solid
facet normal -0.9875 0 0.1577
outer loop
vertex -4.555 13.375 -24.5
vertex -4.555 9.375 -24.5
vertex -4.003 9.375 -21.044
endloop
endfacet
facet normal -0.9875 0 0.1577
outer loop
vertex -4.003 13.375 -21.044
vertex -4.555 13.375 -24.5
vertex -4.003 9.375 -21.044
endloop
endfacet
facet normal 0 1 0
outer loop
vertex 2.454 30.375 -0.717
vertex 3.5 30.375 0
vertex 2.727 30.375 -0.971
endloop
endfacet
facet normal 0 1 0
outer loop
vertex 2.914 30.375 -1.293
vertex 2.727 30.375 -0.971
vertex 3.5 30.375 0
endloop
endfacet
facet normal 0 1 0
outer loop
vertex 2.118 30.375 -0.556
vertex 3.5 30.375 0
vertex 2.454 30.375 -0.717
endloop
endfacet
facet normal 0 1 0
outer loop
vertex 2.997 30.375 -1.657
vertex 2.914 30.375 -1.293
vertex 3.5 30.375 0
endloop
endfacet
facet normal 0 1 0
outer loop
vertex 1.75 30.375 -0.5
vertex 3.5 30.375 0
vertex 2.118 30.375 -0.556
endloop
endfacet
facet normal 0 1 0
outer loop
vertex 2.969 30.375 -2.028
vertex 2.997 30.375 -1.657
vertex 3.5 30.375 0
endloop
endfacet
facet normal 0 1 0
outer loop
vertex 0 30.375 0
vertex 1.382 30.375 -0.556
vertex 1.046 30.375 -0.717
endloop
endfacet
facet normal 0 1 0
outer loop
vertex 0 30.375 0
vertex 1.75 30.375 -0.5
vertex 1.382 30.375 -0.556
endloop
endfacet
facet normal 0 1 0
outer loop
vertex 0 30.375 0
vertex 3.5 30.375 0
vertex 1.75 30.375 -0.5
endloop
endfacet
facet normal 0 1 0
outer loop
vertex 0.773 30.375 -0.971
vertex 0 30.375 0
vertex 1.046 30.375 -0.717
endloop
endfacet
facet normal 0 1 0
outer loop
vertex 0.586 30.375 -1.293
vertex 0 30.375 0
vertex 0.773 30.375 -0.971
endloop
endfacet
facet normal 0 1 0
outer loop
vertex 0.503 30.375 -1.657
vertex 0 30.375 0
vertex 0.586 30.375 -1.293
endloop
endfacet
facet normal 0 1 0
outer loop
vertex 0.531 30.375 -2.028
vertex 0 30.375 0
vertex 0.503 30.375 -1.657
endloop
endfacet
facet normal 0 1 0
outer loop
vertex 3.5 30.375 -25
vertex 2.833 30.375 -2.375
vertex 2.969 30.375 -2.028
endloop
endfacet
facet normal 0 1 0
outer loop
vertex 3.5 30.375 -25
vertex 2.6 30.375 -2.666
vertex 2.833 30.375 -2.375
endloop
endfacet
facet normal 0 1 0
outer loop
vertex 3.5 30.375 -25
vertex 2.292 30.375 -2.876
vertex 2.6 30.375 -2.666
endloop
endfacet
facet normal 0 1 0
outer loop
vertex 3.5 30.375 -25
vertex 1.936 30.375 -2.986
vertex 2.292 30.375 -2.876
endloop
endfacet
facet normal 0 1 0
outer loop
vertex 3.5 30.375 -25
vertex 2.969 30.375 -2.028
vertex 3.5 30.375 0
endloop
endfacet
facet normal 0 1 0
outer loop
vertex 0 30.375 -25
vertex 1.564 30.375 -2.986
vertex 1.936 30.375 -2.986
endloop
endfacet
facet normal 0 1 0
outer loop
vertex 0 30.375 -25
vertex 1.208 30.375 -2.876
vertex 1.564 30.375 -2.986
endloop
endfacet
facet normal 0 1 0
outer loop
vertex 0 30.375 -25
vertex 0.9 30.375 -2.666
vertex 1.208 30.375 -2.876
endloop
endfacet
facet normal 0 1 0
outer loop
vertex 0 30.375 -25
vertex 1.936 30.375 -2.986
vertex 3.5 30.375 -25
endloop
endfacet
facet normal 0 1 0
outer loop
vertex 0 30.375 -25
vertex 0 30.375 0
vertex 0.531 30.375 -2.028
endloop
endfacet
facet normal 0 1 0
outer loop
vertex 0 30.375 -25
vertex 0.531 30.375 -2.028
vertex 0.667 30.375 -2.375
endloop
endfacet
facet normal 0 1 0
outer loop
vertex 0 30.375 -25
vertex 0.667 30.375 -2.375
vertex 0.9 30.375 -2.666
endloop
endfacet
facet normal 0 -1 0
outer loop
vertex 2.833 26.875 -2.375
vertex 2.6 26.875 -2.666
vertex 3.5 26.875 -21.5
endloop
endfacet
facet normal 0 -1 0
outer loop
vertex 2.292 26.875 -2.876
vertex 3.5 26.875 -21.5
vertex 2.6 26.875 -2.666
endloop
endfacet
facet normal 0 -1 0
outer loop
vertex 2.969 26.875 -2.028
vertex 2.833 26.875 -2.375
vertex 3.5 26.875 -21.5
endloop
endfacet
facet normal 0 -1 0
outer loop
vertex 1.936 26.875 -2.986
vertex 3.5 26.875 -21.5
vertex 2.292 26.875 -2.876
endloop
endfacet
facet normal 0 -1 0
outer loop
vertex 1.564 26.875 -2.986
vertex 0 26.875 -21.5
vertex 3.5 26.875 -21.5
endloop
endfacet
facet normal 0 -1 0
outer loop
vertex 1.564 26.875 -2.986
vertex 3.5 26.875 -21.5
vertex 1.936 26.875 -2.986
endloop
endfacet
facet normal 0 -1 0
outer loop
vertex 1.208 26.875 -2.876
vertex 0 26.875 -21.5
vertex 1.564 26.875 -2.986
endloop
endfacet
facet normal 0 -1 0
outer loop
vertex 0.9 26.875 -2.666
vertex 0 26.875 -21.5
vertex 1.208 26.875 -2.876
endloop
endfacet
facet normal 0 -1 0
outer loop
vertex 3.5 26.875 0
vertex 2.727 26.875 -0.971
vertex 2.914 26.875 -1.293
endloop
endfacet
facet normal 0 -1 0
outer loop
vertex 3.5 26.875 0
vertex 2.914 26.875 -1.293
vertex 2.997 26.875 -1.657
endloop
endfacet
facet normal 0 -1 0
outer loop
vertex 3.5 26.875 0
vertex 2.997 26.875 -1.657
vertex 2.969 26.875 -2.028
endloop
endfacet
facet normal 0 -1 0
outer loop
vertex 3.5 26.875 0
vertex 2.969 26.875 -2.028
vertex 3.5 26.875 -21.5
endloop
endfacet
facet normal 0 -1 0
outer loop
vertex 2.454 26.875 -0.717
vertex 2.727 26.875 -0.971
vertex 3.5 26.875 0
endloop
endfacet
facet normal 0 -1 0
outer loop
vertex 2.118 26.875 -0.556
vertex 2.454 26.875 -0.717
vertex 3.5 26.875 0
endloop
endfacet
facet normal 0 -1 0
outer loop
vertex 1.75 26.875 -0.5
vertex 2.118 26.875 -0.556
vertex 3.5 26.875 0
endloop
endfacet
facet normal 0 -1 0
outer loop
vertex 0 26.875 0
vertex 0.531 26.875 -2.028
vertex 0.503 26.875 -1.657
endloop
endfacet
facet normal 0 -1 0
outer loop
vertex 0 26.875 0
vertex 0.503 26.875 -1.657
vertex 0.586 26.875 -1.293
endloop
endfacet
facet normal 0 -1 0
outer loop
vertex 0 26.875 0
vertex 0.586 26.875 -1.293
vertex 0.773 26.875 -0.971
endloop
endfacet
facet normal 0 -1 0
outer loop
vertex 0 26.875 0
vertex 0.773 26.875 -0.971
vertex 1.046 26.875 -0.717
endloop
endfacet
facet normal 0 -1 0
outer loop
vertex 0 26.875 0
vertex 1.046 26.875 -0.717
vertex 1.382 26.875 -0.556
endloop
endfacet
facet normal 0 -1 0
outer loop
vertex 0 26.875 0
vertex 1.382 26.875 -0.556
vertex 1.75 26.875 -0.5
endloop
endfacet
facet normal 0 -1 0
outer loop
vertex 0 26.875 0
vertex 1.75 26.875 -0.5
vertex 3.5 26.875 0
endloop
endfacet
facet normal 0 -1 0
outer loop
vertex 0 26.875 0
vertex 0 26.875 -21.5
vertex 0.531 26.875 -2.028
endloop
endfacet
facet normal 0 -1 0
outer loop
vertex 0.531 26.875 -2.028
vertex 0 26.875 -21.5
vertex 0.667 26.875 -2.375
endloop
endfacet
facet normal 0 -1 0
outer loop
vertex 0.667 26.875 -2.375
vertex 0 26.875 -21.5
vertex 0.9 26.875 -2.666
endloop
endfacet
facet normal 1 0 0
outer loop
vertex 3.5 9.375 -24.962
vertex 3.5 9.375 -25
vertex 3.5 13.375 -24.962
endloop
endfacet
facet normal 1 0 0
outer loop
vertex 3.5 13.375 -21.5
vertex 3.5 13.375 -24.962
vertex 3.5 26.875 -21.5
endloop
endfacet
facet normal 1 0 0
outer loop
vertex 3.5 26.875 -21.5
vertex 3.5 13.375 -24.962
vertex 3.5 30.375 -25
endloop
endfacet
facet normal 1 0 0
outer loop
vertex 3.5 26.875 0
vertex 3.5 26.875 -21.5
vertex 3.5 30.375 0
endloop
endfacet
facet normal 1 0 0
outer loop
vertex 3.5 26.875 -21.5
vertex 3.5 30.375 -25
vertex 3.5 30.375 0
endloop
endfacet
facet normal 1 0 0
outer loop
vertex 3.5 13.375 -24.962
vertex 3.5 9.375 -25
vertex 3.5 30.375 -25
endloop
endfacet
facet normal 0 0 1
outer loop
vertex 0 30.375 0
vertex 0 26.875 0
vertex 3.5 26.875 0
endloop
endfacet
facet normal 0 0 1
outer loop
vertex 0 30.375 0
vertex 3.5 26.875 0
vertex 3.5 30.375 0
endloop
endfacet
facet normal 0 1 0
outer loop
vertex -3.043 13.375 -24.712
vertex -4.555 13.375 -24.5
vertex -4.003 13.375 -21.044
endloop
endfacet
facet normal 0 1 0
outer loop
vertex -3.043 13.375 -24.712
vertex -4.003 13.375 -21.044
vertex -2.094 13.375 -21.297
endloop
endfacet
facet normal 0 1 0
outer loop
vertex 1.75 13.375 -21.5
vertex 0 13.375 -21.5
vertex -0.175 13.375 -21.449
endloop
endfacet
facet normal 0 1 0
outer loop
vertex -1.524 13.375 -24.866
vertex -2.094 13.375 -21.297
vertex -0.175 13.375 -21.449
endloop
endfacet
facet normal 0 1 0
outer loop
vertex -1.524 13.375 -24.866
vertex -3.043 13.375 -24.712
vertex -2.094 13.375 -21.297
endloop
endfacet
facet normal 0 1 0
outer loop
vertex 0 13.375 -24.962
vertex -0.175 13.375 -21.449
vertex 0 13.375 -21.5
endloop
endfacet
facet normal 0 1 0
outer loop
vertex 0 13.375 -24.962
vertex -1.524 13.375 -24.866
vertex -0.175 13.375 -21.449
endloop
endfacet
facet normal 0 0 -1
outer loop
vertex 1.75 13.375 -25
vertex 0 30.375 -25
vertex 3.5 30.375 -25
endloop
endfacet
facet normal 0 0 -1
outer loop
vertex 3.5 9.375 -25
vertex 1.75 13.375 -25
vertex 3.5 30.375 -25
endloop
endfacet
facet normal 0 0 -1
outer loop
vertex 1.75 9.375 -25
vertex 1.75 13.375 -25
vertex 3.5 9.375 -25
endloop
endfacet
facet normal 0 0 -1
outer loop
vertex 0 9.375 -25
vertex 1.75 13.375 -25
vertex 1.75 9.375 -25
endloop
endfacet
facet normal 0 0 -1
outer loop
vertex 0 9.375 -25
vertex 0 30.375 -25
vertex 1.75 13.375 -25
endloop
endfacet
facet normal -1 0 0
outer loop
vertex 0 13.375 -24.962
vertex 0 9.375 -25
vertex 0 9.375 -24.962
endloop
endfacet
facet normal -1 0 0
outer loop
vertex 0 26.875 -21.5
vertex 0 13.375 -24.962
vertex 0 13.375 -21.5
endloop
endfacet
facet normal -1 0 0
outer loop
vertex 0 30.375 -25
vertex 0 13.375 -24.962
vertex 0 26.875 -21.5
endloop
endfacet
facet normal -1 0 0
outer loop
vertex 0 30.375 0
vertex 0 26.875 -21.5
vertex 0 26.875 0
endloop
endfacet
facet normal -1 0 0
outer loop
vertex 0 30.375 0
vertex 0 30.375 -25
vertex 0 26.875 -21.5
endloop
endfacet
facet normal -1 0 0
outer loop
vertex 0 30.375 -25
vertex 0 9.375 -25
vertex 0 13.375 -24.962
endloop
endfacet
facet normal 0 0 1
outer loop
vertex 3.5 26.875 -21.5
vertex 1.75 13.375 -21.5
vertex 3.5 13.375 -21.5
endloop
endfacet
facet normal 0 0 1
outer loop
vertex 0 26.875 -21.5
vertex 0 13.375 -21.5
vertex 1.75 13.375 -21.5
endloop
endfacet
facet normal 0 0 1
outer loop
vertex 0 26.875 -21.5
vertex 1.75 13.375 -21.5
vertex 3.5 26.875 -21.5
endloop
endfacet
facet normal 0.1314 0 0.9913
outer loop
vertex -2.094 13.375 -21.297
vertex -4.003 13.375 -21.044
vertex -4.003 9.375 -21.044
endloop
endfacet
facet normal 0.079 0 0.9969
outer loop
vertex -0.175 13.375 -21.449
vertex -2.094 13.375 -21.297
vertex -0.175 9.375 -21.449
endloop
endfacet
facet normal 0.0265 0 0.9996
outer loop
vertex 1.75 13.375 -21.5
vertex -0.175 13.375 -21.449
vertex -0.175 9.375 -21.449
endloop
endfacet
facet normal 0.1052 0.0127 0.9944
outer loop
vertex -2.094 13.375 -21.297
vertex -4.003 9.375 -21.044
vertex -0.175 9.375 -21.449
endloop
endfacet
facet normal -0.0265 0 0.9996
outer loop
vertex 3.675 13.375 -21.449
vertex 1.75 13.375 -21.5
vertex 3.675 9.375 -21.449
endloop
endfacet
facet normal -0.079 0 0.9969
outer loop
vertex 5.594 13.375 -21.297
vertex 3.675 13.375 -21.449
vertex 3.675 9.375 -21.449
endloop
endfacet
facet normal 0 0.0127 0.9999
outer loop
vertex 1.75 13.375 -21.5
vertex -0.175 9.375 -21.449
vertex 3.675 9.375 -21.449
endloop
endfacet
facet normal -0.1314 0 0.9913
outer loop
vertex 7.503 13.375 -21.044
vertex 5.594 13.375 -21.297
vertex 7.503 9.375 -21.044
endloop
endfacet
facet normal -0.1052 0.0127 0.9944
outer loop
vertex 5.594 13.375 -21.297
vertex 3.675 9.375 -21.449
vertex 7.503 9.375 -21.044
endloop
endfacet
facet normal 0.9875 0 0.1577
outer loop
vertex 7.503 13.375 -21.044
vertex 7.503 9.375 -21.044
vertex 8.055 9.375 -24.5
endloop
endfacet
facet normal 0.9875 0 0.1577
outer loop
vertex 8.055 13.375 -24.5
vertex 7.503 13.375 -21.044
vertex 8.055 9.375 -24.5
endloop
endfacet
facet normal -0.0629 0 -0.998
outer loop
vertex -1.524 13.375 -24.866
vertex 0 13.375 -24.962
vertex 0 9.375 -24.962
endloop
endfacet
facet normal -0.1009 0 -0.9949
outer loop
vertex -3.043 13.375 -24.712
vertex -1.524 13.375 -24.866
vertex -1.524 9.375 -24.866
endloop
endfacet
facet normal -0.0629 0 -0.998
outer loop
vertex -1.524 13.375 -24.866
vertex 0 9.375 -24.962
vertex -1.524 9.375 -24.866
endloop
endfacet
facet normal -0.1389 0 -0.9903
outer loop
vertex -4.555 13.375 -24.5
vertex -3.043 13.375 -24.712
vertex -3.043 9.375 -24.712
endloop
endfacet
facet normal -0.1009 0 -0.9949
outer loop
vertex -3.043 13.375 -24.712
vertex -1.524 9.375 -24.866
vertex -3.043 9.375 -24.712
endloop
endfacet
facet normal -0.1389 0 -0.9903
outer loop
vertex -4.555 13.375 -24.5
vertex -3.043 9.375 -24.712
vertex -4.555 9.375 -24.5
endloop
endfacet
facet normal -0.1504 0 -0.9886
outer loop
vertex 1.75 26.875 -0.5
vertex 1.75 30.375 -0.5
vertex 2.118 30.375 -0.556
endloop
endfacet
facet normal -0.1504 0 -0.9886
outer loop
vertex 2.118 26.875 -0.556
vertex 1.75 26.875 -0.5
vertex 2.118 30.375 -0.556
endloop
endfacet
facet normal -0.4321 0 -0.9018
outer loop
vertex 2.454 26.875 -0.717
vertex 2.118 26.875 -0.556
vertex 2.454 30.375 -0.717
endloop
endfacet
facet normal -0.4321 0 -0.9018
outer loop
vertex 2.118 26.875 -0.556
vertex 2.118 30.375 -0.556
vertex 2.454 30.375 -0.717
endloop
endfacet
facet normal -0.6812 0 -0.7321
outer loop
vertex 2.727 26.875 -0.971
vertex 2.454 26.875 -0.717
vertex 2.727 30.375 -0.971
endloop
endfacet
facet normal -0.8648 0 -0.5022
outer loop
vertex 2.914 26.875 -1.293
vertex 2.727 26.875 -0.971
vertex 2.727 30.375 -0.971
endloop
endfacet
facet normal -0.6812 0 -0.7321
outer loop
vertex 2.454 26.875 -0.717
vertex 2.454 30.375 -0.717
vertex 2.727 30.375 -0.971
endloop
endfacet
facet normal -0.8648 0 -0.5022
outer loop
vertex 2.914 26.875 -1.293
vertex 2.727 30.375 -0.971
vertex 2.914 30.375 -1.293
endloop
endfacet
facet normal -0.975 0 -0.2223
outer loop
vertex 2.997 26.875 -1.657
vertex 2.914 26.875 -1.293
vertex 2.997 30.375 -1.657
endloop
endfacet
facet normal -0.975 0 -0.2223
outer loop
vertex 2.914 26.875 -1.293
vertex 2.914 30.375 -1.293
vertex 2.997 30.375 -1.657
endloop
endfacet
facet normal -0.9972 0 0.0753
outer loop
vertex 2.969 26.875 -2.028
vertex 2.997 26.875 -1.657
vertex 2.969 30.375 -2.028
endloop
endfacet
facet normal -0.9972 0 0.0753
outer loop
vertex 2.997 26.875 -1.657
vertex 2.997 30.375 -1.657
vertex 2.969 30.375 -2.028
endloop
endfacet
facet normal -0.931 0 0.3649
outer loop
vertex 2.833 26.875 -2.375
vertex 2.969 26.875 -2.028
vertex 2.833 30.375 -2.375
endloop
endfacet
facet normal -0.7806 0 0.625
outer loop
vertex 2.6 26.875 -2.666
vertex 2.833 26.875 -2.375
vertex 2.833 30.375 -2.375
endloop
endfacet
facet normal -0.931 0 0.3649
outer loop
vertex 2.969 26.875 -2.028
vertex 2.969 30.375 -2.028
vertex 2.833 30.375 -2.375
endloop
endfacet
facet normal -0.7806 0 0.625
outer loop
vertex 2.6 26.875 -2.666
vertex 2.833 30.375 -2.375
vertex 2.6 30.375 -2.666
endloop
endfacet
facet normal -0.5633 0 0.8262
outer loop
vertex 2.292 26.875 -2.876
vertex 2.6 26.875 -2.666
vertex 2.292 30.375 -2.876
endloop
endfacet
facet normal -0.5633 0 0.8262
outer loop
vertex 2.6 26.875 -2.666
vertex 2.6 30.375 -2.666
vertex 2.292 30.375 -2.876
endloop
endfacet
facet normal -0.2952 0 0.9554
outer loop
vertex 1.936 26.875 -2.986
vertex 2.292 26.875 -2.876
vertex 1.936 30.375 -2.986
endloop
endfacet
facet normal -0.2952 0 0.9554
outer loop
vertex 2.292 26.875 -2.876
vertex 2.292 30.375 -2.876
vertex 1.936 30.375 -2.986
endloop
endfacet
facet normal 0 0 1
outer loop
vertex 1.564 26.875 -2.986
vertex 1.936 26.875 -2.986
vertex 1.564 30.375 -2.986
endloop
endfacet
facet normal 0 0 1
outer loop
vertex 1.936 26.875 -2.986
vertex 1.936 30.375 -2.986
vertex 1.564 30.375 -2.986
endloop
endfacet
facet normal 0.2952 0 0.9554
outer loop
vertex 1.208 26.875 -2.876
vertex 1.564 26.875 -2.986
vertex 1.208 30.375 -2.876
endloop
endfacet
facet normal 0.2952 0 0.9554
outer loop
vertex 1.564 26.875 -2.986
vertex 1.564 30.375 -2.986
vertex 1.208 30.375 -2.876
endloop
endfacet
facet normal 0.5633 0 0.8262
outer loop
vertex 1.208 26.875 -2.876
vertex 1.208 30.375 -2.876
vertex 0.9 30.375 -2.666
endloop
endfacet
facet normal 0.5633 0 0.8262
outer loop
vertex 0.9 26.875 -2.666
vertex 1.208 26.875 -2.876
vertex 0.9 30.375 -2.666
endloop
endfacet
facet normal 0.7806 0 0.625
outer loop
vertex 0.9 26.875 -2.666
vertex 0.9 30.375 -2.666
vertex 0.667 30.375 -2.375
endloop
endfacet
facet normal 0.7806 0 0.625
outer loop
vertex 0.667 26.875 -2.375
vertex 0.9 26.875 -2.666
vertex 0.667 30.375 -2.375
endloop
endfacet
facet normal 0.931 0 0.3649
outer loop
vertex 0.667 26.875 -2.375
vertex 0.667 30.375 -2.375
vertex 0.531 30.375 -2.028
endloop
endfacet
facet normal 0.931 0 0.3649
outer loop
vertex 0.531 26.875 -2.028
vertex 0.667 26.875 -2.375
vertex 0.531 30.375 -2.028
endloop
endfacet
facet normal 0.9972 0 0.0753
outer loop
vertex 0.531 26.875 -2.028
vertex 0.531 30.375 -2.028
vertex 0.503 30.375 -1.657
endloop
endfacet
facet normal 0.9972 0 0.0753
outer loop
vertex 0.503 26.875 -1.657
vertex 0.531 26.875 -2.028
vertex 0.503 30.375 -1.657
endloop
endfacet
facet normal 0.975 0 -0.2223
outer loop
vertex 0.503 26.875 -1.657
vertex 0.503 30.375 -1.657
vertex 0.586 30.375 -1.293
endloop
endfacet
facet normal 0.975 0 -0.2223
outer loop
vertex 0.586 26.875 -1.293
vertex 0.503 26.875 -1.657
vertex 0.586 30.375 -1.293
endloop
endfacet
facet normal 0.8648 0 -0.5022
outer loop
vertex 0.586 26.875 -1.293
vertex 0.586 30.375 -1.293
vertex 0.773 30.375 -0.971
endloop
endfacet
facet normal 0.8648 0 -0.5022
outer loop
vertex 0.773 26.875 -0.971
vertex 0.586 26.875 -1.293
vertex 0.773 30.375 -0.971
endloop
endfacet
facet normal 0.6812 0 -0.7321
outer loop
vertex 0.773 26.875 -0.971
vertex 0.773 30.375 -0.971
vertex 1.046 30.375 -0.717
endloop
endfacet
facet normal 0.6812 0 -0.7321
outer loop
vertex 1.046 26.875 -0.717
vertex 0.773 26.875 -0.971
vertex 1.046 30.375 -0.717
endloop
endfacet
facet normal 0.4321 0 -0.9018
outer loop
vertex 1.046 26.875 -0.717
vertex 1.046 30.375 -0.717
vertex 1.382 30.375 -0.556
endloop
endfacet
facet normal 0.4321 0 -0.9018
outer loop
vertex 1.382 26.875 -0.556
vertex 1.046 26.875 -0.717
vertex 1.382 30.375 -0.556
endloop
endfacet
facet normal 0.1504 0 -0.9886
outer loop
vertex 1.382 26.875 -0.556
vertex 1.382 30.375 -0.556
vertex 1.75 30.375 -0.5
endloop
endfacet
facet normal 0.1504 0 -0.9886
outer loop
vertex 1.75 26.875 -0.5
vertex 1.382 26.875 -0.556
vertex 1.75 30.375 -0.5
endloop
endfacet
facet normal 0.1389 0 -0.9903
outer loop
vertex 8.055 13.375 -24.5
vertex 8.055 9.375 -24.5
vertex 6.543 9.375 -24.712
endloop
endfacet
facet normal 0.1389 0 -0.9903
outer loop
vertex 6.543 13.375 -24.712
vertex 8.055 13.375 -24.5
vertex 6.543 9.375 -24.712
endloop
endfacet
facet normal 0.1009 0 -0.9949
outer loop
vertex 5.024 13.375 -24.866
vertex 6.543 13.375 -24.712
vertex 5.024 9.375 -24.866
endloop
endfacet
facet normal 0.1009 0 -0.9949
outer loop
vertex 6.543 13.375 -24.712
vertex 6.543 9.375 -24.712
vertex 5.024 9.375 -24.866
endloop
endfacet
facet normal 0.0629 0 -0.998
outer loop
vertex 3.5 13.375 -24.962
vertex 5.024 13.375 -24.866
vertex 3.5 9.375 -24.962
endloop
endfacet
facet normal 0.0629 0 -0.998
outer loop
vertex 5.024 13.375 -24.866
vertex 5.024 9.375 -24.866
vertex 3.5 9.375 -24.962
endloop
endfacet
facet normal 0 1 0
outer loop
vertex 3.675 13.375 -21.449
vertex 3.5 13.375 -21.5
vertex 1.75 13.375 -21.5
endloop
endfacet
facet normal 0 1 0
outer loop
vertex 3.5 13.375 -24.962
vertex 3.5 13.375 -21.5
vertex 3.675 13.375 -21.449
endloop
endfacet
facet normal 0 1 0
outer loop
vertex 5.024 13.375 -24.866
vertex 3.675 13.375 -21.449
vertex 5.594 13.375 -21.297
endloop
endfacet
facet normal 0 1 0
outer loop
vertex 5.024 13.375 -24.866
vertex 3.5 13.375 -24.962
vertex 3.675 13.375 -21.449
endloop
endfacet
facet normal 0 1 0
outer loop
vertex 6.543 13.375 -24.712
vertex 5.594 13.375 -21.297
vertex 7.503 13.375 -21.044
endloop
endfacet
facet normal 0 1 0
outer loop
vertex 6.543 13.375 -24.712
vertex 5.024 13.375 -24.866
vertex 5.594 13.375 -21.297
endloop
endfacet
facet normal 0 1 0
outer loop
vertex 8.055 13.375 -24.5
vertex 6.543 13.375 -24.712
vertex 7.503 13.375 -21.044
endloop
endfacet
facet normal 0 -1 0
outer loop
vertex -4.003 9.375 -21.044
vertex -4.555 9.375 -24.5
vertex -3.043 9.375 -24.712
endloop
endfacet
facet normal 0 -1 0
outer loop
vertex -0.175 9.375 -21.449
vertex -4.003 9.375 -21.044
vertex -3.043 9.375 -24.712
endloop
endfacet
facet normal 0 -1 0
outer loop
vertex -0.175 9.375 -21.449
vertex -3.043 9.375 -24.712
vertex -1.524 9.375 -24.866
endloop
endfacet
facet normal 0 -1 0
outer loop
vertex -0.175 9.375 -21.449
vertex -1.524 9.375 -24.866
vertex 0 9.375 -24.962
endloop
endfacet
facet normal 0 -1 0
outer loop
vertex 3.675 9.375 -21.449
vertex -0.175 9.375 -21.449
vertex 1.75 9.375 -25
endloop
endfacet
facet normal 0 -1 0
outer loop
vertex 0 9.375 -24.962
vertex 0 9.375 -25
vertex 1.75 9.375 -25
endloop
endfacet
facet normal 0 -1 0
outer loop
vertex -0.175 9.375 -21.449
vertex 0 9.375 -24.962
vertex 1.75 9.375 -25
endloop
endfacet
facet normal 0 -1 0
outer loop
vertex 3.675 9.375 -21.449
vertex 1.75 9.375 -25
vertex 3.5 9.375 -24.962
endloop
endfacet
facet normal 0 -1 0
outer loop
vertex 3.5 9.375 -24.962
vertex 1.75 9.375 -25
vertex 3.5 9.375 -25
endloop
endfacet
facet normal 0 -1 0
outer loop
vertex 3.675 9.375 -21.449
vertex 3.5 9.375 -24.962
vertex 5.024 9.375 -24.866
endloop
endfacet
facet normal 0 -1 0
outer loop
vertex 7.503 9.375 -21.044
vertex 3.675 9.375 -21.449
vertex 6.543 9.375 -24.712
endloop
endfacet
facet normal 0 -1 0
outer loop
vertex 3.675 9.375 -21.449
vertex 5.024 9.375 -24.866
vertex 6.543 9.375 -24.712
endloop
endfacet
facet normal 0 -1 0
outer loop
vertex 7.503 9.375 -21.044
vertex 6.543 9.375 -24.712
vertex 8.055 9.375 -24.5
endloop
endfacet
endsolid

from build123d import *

# Parameters (mm, degrees)
BOSS_EXTRUDE1_DEPTH = 3.5
BOSS_EXTRUDE3_DEPTH = 4
SKETCH4_R           = 1.25
CUT_EXTRUDE1_DEPTH  = 4


with BuildPart() as part:
    # Sketch1 → Boss-Extrude1 (new body)
    with BuildSketch(Plane(origin=(0, 0, 0), x_dir=(0, 0, -1), z_dir=(1, 0, 0))):
        Polygon((0, 30.375), (25, 30.375), (25, 9.375), (21.5, 9.375), (21.5, 26.875), (0, 26.875), align=None)
    extrude(amount=BOSS_EXTRUDE1_DEPTH)

    # Sketch3 → Boss-Extrude3 (add)
    with BuildSketch(Plane(origin=(0, 9.375, 0), x_dir=(-1, 0, 0), z_dir=(0, -1, 0))):
        with BuildLine():
            Line((4.554760106, 24.5), (4.003093597, 21.04375))
            ThreePointArc((4.003093597, 21.04375), (-1.75, 21.5), (-7.503093597, 21.04375))
            Line((-7.503093597, 21.04375), (-8.054760106, 24.5))
            ThreePointArc((-8.054760106, 24.5), (-1.75, 25), (4.554760106, 24.5))
        make_face()
    extrude(amount=-BOSS_EXTRUDE3_DEPTH)

    # Sketch4 → Cut-Extrude1 (cut)
    with BuildSketch(Plane(origin=(0, 30.375, 0), x_dir=(1, 0, 0), z_dir=(0, 1, 0))):
        with Locations(Location((1.75, 1.75, 0), (0, 0, 270))):
            Circle(SKETCH4_R)
    extrude(amount=-CUT_EXTRUDE1_DEPTH, mode=Mode.SUBTRACT)


solid = part.part
